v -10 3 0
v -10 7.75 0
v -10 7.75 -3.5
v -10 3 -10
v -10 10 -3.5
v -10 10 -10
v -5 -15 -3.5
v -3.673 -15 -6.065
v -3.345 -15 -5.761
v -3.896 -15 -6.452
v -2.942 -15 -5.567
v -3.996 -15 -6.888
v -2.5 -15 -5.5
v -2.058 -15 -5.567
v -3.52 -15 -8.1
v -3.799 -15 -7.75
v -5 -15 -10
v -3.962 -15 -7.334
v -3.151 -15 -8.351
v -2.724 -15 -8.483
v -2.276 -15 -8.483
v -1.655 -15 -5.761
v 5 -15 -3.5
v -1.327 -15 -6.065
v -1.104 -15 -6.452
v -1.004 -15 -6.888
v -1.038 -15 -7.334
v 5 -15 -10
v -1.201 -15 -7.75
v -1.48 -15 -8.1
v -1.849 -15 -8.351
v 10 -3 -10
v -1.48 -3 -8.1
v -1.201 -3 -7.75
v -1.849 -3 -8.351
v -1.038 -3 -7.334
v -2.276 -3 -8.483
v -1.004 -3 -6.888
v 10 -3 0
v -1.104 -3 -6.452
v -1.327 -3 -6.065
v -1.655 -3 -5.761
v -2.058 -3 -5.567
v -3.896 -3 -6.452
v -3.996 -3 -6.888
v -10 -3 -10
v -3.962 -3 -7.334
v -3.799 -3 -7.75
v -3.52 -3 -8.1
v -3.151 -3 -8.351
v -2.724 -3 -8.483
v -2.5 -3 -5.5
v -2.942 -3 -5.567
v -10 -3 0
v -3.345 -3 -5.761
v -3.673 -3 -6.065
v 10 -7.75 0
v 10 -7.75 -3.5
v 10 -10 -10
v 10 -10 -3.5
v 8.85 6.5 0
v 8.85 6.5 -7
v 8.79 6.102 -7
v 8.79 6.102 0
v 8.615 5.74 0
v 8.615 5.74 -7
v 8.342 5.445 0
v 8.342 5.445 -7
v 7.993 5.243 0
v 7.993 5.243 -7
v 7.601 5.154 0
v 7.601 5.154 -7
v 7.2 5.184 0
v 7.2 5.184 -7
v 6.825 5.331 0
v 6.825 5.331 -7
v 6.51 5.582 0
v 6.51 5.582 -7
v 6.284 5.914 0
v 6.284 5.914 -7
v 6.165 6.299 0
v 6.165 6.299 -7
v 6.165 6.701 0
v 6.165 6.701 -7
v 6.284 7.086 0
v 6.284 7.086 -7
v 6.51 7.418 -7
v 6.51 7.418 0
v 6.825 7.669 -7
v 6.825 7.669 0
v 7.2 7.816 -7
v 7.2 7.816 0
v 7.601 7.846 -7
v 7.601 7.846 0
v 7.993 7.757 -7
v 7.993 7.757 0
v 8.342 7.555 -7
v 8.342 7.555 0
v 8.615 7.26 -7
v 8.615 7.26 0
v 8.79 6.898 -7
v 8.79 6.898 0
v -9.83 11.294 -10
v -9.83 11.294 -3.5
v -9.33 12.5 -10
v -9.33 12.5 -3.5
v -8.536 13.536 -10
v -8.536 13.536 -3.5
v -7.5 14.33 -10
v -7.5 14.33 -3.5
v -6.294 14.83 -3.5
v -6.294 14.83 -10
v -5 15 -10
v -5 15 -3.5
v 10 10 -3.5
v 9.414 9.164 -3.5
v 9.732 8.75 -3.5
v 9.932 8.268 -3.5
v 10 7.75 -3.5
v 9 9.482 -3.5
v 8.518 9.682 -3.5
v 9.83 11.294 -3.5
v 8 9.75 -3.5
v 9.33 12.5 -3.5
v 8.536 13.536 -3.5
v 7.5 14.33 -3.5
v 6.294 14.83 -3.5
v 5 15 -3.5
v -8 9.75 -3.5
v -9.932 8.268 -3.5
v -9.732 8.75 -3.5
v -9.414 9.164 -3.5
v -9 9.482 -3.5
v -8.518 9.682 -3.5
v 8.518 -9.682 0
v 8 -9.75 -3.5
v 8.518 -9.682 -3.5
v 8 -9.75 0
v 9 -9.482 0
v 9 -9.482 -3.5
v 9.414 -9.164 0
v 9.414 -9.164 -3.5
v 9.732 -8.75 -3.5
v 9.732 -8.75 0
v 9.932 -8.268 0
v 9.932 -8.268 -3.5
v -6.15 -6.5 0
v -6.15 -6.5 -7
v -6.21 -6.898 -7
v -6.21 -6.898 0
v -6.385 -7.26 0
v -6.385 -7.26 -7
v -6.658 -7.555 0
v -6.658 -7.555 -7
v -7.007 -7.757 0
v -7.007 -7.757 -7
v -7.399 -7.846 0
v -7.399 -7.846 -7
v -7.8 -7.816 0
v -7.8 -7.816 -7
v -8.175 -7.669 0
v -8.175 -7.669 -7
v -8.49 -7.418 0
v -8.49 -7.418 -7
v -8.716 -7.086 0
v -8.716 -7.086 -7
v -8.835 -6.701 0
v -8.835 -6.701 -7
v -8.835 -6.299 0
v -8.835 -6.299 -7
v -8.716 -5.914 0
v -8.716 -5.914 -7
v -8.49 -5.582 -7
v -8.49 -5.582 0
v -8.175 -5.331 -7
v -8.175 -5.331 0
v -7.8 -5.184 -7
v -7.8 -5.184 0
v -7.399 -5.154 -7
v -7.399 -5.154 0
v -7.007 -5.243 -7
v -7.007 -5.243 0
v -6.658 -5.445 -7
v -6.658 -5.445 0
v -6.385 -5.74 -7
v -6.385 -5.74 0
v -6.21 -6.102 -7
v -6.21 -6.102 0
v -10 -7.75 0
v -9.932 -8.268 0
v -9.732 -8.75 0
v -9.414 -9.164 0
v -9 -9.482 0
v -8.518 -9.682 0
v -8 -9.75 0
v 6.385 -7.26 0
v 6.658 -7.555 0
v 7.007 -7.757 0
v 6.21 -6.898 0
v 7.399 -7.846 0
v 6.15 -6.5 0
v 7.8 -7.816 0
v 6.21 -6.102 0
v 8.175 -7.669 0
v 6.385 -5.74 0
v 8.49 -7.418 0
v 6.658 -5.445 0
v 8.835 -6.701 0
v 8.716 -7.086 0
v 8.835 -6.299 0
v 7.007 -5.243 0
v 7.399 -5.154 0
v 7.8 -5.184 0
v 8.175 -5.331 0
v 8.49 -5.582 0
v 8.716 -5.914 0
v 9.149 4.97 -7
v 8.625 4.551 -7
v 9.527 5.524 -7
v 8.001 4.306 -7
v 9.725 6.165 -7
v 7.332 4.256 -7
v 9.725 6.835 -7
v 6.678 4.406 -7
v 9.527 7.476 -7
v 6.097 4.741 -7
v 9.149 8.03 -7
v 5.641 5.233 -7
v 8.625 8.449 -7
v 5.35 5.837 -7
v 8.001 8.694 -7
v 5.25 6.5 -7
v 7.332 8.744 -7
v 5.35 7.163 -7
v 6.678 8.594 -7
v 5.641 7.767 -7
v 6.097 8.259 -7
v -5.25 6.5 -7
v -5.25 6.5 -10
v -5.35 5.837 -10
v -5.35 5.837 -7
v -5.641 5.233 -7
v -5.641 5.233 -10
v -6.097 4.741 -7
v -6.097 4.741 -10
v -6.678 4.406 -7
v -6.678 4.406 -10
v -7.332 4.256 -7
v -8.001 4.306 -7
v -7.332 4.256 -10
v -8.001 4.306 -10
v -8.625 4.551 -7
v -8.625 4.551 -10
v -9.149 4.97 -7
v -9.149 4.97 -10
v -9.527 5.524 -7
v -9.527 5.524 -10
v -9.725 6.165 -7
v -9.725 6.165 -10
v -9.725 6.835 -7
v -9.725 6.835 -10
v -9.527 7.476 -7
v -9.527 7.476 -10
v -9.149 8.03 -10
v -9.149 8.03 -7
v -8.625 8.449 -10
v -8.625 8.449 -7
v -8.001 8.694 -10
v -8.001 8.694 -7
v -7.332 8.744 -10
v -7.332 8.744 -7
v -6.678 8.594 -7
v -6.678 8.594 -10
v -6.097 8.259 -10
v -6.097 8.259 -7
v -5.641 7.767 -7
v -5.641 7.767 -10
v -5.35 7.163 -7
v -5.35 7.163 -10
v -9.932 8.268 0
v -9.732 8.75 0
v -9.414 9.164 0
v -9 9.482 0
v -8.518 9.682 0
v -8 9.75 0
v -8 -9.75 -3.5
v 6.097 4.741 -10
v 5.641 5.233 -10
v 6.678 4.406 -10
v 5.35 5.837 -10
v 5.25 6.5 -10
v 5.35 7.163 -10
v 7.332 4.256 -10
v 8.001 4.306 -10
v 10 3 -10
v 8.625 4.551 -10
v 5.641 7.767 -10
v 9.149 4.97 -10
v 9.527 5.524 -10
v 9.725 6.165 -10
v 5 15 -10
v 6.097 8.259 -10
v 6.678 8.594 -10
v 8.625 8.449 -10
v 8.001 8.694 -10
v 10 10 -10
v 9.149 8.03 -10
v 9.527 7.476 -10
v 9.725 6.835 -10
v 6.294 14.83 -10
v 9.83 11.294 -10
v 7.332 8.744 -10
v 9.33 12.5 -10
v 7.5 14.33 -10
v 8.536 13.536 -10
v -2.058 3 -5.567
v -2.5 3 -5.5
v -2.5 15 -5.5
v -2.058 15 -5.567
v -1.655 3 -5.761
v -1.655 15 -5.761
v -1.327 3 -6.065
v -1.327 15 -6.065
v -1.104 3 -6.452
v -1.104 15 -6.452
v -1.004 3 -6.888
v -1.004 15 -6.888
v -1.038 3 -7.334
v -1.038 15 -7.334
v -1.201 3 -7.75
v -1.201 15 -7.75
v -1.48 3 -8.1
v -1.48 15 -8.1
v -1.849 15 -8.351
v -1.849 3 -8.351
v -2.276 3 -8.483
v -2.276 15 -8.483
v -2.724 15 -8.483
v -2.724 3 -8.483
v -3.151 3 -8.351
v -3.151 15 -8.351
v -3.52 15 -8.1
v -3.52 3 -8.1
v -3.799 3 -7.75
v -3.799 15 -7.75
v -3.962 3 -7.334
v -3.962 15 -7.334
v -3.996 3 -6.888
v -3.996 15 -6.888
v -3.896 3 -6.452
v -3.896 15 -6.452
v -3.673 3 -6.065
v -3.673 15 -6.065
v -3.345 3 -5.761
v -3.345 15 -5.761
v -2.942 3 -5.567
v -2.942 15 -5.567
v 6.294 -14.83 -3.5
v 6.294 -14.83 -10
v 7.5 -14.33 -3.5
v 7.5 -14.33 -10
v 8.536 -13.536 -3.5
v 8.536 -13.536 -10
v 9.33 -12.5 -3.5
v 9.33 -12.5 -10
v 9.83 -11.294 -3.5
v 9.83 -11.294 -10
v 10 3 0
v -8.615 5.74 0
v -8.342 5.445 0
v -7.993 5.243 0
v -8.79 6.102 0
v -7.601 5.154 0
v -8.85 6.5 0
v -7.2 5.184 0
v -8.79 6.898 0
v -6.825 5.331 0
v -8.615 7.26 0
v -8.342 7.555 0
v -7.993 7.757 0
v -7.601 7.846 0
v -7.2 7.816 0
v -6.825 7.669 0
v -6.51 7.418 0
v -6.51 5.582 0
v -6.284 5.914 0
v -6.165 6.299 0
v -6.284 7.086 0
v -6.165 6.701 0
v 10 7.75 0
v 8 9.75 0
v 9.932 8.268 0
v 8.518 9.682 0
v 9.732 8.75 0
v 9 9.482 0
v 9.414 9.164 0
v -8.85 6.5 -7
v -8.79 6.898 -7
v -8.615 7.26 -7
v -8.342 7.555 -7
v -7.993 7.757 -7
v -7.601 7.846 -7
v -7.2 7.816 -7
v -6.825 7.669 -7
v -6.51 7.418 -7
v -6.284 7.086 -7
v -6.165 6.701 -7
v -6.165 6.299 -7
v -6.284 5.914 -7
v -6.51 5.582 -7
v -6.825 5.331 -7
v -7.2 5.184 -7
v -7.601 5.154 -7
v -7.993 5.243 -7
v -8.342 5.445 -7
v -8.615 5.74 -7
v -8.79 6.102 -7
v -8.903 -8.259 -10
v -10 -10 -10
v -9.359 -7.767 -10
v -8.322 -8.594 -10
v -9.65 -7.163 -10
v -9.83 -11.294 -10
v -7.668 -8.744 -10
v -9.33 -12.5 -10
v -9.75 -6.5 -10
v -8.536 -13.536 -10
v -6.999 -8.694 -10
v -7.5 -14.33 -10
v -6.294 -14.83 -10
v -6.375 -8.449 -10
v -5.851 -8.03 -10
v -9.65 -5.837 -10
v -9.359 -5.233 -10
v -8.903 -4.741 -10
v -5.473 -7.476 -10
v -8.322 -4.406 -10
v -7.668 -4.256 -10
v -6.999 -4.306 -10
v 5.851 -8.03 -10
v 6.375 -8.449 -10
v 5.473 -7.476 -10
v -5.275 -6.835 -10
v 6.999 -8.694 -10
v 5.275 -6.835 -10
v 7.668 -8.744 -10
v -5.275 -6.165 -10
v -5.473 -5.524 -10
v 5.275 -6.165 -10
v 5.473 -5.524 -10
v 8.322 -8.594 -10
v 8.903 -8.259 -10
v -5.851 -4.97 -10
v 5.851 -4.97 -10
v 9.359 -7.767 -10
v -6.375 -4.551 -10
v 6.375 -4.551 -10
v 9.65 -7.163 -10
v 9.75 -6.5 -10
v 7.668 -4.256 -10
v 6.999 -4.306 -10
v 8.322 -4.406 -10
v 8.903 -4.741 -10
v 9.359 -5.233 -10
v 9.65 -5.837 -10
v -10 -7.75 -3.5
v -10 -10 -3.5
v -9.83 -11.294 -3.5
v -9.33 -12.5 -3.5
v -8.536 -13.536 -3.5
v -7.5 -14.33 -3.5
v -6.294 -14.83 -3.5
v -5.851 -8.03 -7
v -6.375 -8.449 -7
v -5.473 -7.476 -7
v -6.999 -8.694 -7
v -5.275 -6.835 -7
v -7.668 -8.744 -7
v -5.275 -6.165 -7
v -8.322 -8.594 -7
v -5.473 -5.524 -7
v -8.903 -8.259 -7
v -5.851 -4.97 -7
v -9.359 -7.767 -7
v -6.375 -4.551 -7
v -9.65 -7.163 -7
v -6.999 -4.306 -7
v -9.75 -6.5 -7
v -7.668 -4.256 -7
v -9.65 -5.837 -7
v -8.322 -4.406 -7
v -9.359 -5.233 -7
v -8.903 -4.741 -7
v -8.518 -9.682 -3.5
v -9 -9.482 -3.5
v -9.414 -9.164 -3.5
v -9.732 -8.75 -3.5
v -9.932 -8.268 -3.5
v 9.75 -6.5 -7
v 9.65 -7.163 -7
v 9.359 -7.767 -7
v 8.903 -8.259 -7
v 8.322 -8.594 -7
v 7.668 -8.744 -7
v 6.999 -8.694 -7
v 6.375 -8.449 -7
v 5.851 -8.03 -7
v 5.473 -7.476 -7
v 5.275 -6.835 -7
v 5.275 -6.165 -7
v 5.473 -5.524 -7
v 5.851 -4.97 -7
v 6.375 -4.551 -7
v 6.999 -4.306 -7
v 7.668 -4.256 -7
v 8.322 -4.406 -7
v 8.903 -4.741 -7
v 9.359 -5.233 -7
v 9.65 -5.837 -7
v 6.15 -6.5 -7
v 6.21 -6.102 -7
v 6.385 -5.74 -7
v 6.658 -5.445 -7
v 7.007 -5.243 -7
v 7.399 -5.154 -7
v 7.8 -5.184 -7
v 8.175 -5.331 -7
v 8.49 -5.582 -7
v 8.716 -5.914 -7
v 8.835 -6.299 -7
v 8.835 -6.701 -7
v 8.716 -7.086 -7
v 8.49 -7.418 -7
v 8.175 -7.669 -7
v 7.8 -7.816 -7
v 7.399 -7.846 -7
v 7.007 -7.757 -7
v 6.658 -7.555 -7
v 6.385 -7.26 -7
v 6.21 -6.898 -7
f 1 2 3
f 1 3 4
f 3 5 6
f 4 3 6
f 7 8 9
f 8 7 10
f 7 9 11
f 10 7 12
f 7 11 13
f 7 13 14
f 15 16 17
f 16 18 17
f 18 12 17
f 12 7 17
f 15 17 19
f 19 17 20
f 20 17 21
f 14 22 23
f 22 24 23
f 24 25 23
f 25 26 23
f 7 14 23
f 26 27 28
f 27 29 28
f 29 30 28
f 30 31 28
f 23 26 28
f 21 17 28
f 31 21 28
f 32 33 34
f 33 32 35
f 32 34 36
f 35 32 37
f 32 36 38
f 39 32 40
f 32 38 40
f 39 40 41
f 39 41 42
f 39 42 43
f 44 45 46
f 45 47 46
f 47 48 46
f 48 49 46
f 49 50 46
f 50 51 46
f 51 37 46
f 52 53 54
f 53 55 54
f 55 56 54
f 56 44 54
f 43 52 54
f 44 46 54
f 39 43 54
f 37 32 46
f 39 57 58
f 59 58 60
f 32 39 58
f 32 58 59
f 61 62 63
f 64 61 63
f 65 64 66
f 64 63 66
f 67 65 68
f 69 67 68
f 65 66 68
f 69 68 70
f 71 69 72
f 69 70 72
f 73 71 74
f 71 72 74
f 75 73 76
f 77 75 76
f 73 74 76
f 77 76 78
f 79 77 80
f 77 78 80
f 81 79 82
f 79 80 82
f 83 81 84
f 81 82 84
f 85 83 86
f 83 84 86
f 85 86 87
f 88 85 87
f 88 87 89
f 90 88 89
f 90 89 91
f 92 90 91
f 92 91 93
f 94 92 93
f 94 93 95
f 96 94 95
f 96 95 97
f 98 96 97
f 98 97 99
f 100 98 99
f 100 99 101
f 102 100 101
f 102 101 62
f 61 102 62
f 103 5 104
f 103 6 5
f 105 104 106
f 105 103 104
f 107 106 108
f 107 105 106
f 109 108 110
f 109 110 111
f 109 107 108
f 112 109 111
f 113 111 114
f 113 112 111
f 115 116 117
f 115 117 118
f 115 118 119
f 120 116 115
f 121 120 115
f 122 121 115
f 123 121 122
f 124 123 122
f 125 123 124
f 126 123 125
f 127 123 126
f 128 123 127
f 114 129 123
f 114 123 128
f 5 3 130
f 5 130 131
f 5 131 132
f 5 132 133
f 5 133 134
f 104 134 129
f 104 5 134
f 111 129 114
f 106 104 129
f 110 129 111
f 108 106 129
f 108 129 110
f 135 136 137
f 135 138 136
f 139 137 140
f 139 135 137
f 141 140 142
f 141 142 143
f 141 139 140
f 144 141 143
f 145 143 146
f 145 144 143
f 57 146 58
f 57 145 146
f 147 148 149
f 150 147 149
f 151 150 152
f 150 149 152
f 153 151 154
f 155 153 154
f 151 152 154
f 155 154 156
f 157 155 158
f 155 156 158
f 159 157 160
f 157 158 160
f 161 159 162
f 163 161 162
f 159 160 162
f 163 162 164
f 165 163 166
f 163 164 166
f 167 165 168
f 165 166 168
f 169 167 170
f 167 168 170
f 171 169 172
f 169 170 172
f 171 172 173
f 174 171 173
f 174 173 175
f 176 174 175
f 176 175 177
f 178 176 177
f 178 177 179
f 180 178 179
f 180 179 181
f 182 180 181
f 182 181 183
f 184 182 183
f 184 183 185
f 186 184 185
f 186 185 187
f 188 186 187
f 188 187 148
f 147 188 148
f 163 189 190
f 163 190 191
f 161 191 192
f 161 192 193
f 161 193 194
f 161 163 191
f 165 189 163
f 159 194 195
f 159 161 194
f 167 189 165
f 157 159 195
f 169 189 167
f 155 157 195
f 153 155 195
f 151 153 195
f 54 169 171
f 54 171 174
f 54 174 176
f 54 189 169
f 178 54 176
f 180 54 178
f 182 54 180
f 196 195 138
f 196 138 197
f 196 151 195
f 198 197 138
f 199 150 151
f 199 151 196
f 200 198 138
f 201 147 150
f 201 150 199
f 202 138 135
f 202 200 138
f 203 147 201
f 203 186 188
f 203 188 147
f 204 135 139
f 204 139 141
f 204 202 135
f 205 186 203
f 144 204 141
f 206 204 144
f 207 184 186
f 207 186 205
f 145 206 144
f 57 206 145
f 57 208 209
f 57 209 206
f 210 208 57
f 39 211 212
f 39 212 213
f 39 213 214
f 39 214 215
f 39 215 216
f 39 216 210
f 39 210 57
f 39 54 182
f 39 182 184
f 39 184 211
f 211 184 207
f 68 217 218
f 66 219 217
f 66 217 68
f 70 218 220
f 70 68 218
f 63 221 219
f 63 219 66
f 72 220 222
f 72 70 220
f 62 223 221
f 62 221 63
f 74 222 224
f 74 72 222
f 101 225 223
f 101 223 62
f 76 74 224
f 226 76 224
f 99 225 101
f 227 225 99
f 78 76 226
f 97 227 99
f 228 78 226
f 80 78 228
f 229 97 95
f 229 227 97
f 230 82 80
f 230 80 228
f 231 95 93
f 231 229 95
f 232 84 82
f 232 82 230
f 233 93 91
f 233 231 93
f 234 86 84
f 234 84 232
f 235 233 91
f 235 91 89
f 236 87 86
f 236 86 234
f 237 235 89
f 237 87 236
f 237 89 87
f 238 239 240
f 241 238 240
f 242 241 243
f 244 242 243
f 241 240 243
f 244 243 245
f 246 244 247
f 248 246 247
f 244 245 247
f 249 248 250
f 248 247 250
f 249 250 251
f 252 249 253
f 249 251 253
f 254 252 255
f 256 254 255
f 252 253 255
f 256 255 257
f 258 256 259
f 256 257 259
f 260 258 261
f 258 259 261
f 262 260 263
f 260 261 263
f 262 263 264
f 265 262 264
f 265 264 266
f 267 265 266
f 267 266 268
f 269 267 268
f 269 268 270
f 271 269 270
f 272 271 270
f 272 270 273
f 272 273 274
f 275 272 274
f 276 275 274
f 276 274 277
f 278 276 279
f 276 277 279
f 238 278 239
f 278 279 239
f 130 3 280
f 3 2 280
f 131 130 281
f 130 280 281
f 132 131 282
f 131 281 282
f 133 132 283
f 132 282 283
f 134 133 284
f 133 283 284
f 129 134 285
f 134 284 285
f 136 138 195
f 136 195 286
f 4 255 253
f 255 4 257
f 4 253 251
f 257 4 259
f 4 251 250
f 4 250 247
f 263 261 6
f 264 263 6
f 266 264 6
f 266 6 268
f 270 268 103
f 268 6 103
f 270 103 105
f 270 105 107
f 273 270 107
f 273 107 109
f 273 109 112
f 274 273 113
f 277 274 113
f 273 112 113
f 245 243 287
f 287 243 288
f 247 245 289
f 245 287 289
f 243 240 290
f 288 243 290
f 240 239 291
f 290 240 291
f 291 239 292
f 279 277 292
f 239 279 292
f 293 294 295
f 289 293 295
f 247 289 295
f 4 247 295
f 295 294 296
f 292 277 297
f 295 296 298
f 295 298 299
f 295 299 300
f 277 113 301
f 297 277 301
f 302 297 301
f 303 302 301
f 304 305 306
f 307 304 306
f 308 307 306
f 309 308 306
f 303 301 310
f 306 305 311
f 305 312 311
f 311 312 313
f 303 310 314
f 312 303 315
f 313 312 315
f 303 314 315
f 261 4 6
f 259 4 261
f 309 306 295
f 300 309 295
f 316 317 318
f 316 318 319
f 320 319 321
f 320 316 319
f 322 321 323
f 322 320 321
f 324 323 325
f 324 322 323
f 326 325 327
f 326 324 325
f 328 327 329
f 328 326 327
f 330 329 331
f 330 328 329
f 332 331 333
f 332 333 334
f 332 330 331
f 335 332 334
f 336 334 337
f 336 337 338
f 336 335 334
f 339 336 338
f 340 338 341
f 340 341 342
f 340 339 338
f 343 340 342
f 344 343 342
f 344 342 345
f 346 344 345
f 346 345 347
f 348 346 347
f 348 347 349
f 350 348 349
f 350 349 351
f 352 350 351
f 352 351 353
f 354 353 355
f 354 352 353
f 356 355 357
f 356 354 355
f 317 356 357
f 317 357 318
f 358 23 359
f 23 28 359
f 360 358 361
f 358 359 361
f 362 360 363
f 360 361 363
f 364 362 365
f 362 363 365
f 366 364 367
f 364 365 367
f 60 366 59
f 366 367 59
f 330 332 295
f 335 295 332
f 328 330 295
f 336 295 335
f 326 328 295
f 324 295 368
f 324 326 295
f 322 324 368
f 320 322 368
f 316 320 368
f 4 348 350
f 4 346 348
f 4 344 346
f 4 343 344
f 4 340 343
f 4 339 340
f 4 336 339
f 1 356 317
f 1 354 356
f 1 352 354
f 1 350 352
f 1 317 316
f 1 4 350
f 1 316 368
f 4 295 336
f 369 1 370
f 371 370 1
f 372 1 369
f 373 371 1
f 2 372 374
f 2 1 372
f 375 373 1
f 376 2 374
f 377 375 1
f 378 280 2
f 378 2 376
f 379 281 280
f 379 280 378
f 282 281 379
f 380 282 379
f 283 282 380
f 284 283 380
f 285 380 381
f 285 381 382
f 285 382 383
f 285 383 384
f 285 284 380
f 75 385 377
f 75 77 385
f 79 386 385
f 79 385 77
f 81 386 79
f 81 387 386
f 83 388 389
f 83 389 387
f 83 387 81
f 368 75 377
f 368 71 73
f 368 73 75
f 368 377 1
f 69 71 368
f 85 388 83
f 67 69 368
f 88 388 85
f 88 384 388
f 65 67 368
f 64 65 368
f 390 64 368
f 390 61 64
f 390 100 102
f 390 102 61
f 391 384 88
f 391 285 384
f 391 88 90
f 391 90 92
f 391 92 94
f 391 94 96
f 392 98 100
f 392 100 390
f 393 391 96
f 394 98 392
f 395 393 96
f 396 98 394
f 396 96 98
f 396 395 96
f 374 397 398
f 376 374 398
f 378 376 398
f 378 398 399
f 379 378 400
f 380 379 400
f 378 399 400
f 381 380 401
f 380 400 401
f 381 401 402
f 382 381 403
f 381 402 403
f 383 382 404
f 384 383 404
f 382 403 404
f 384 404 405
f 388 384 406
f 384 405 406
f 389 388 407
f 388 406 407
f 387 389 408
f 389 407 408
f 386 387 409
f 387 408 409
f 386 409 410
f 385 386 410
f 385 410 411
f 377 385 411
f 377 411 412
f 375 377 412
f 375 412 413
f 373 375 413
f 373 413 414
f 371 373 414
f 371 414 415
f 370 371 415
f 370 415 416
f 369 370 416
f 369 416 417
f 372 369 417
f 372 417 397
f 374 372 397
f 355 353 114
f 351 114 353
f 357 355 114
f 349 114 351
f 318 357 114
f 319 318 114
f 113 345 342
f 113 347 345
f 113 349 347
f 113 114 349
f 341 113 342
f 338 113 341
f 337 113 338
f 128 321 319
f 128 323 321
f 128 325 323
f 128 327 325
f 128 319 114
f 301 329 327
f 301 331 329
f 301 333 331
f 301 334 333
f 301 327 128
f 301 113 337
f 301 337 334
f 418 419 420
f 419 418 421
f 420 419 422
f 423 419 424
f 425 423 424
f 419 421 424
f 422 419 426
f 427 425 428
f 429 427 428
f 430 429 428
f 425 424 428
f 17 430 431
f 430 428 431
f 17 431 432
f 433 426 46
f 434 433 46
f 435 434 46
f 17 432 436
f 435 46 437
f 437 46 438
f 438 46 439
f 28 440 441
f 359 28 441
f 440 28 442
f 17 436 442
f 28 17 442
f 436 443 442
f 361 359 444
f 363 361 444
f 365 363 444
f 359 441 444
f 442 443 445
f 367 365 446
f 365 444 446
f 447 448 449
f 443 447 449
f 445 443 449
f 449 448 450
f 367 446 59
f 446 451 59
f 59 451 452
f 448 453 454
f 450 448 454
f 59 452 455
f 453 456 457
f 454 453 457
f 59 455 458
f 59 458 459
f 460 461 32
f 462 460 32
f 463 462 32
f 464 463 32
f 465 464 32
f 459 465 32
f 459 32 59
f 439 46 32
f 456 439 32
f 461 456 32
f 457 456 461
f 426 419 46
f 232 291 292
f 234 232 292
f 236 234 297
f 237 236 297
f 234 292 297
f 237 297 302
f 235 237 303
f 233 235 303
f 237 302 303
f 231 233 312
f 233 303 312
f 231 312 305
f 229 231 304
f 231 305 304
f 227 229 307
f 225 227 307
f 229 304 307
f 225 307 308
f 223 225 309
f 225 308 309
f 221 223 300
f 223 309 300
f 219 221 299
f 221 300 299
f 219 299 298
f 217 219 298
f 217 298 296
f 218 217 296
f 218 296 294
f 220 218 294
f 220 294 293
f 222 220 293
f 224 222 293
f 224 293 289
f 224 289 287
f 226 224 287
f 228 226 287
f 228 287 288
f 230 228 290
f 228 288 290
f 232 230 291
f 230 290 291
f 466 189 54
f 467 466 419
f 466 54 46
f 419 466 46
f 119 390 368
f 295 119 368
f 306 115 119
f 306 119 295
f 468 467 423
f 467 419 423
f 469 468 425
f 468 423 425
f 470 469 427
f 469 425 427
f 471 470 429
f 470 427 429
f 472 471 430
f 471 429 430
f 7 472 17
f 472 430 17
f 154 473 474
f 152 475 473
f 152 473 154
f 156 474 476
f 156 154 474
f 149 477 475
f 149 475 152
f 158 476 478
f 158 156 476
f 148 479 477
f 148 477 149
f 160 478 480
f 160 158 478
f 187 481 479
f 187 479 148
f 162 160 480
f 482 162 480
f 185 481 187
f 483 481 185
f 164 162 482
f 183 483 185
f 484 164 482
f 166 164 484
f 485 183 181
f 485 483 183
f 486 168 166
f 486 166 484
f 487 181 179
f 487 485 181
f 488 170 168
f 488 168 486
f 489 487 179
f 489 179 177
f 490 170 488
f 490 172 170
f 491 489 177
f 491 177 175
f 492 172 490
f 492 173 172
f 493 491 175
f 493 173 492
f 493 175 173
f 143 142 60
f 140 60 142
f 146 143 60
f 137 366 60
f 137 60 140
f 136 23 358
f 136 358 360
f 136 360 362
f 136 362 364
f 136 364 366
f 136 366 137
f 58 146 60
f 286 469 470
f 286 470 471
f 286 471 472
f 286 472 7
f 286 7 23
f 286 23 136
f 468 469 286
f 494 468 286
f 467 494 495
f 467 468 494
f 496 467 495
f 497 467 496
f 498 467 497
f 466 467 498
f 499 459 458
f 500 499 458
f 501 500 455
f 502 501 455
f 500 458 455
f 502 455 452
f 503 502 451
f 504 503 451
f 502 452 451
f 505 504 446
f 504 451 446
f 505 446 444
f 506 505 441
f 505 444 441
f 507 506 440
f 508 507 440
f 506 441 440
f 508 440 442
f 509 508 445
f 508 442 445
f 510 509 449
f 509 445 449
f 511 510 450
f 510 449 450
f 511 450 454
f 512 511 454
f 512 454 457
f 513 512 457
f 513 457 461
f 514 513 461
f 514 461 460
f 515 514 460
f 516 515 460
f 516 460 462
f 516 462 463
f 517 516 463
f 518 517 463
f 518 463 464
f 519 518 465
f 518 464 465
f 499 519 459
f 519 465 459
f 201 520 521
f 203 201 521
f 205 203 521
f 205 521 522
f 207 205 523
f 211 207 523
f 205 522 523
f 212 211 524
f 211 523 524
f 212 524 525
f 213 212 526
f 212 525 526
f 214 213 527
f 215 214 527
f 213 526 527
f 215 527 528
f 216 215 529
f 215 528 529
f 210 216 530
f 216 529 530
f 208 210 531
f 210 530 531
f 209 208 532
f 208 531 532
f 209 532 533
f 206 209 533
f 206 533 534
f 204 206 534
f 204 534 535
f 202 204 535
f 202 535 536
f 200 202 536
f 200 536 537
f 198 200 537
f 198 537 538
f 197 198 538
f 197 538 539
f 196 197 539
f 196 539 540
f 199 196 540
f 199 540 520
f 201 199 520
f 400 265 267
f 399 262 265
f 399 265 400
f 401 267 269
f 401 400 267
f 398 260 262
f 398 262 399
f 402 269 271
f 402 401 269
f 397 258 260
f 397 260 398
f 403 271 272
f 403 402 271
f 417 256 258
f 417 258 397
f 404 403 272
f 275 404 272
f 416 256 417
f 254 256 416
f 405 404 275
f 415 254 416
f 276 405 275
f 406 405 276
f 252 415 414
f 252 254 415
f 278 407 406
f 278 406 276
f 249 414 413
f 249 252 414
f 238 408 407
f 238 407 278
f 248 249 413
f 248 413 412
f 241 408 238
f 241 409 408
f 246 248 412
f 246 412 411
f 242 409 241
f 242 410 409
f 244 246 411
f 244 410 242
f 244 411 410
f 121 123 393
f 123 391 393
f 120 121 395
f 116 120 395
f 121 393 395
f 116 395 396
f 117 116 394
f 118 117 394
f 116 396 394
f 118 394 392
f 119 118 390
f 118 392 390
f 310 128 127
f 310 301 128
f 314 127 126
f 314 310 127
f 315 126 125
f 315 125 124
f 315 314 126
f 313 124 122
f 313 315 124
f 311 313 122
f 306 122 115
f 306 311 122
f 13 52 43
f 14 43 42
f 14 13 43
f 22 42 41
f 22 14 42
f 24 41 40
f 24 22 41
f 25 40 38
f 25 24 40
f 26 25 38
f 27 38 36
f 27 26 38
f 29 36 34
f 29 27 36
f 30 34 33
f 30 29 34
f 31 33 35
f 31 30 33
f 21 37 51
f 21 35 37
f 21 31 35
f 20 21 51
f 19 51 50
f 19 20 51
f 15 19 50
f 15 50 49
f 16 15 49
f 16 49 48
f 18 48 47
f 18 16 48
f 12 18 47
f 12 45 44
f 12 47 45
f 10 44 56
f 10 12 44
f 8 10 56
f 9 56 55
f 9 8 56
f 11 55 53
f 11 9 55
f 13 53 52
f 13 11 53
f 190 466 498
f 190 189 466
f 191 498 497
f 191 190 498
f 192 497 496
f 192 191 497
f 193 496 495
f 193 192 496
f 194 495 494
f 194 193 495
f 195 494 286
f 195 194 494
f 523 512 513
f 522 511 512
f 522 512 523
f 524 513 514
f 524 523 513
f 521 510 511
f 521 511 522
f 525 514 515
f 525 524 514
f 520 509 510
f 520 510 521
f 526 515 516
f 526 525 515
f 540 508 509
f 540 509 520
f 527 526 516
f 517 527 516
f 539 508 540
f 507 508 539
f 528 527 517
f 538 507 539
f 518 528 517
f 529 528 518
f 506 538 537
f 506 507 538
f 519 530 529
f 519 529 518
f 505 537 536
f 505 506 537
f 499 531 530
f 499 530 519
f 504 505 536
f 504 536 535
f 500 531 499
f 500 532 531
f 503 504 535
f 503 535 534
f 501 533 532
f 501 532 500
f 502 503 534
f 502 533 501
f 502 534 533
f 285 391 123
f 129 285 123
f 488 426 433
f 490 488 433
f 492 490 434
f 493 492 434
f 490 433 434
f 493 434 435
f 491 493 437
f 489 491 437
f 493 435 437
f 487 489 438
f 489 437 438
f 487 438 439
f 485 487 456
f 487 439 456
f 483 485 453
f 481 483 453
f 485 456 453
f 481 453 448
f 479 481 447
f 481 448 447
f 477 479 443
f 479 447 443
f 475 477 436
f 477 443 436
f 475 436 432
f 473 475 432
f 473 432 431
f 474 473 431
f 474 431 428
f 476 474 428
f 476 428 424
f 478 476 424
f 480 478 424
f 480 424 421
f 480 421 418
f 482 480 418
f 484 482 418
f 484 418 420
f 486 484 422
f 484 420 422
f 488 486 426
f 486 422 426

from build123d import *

# Parameters (mm, degrees)
SKETCH_1_W               = 20
SKETCH_1_H               = 10
SKETCH_1_R               = 1.5
EXTRUDE_1_DEPTH          = 15
CUT_EXTRUDE_3_DEPTH      = 21.615528128
CUT_EXTRUDE_3_DEPTH_BACK = 21.615528128
SKETCH_2_W               = 3.5
SKETCH_2_H               = 5.25
SKETCH_4_R               = 1.35
CUT_EXTRUDE_4_DEPTH      = 21.615528128
FILLET_1_R               = 5
FILLET_2_R               = 2
SKETCH_6_R               = 2.25
CUT_EXTRUDE_6_DEPTH      = 3
SKETCH_7_W               = 10
SKETCH_7_H               = 6
CUT_EXTRUDE_7_DEPTH      = 27.925824036


with BuildPart() as part:
    # 草图1 → 凸台-拉伸1 (new, symmetric)
    with BuildSketch(Plane(origin=(0, 0, 0), x_dir=(1, 0, 0), z_dir=(0, 1, 0))):
        with Locations((0, 5)):
            Rectangle(SKETCH_1_W, SKETCH_1_H)
        with Locations(Location((-2.5, 7, 0), (0, 0, 270))):
            Circle(SKETCH_1_R, mode=Mode.SUBTRACT)
    extrude(amount=EXTRUDE_1_DEPTH, both=True)

    # 草图2 → 切除-拉伸3 (cut, two sides: drawn at the far end of the back side and taken through both)
    with BuildSketch(Plane(origin=(0, 0, 0), x_dir=(0, 0, -1), z_dir=(1, 0, 0)).offset(-CUT_EXTRUDE_3_DEPTH_BACK)):
        with Locations((1.75, -12.375)):
            Rectangle(SKETCH_2_W, SKETCH_2_H)
        with Locations((1.75, 12.375)):
            Rectangle(SKETCH_2_W, SKETCH_2_H)
    extrude(amount=CUT_EXTRUDE_3_DEPTH + CUT_EXTRUDE_3_DEPTH_BACK, mode=Mode.SUBTRACT)

    # 草图4 → 切除-拉伸4 (cut, through all)
    with BuildSketch(Plane(origin=(0, 0, -10), x_dir=(-1, 0, 0), z_dir=(0, 0, -1))):
        with Locations((-7.5, -6.5)):
            Circle(SKETCH_4_R)
        with Locations(Location((7.5, -6.5, 0), (0, 0, 180))):
            Circle(SKETCH_4_R)
        with Locations((7.5, 6.5)):
            Circle(SKETCH_4_R)
        with Locations(Location((-7.5, 6.5, 0), (0, 0, 180))):
            Circle(SKETCH_4_R)
    extrude(amount=-CUT_EXTRUDE_4_DEPTH, mode=Mode.SUBTRACT)

    # 圆角1
    fillet_1_edges = [part.edges().sort_by_distance(p)[0] for p in [
        (-10, -15, -6.75),
        (10, -15, -6.75),
        (-10, 15, -6.75),
        (10, 15, -6.75),
    ]]
    fillet(fillet_1_edges, radius=FILLET_1_R)

    # 圆角2
    fillet_2_edges = [part.edges().sort_by_distance(p)[0] for p in [
        (10, -9.75, -1.75),
        (-10, -9.75, -1.75),
        (-10, 9.75, -1.75),
        (10, 9.75, -1.75),
    ]]
    fillet(fillet_2_edges, radius=FILLET_2_R)

    # 草图6 → 切除-拉伸6 (cut)
    with BuildSketch(Plane(origin=(0, 0, -10), x_dir=(-1, 0, 0), z_dir=(0, 0, -1))):
        with Locations((-7.5, 6.5)):
            Circle(SKETCH_6_R)
        with Locations(Location((-7.5, -6.5, 0), (0, 0, 180))):
            Circle(SKETCH_6_R)
        with Locations((7.5, -6.5)):
            Circle(SKETCH_6_R)
        with Locations(Location((7.5, 6.5, 0), (0, 0, 180))):
            Circle(SKETCH_6_R)
    extrude(amount=-CUT_EXTRUDE_6_DEPTH, mode=Mode.SUBTRACT)

    # 草图7 → 切除-拉伸7 (cut, through all)
    with BuildSketch(Plane.ZY.offset(10)):
        with Locations((-5, 0)):
            Rectangle(SKETCH_7_W, SKETCH_7_H)
    extrude(amount=-CUT_EXTRUDE_7_DEPTH, mode=Mode.SUBTRACT)


with BuildPart() as cut_extrude_7_piece_1:
    # of the separate pieces the step leaves, piece 1, a body of its own (cut_extrude_7_pieces)
    add(part.part.solids().sort_by_distance((10, 7.75, 0))[0])


with BuildPart() as cut_extrude_7_piece_2:
    # of the separate pieces the step leaves, piece 2, a body of its own (cut_extrude_7_pieces)
    add(part.part.solids().sort_by_distance((10, -3, -10))[0])


solid = Compound([cut_extrude_7_piece_1.part, cut_extrude_7_piece_2.part])
